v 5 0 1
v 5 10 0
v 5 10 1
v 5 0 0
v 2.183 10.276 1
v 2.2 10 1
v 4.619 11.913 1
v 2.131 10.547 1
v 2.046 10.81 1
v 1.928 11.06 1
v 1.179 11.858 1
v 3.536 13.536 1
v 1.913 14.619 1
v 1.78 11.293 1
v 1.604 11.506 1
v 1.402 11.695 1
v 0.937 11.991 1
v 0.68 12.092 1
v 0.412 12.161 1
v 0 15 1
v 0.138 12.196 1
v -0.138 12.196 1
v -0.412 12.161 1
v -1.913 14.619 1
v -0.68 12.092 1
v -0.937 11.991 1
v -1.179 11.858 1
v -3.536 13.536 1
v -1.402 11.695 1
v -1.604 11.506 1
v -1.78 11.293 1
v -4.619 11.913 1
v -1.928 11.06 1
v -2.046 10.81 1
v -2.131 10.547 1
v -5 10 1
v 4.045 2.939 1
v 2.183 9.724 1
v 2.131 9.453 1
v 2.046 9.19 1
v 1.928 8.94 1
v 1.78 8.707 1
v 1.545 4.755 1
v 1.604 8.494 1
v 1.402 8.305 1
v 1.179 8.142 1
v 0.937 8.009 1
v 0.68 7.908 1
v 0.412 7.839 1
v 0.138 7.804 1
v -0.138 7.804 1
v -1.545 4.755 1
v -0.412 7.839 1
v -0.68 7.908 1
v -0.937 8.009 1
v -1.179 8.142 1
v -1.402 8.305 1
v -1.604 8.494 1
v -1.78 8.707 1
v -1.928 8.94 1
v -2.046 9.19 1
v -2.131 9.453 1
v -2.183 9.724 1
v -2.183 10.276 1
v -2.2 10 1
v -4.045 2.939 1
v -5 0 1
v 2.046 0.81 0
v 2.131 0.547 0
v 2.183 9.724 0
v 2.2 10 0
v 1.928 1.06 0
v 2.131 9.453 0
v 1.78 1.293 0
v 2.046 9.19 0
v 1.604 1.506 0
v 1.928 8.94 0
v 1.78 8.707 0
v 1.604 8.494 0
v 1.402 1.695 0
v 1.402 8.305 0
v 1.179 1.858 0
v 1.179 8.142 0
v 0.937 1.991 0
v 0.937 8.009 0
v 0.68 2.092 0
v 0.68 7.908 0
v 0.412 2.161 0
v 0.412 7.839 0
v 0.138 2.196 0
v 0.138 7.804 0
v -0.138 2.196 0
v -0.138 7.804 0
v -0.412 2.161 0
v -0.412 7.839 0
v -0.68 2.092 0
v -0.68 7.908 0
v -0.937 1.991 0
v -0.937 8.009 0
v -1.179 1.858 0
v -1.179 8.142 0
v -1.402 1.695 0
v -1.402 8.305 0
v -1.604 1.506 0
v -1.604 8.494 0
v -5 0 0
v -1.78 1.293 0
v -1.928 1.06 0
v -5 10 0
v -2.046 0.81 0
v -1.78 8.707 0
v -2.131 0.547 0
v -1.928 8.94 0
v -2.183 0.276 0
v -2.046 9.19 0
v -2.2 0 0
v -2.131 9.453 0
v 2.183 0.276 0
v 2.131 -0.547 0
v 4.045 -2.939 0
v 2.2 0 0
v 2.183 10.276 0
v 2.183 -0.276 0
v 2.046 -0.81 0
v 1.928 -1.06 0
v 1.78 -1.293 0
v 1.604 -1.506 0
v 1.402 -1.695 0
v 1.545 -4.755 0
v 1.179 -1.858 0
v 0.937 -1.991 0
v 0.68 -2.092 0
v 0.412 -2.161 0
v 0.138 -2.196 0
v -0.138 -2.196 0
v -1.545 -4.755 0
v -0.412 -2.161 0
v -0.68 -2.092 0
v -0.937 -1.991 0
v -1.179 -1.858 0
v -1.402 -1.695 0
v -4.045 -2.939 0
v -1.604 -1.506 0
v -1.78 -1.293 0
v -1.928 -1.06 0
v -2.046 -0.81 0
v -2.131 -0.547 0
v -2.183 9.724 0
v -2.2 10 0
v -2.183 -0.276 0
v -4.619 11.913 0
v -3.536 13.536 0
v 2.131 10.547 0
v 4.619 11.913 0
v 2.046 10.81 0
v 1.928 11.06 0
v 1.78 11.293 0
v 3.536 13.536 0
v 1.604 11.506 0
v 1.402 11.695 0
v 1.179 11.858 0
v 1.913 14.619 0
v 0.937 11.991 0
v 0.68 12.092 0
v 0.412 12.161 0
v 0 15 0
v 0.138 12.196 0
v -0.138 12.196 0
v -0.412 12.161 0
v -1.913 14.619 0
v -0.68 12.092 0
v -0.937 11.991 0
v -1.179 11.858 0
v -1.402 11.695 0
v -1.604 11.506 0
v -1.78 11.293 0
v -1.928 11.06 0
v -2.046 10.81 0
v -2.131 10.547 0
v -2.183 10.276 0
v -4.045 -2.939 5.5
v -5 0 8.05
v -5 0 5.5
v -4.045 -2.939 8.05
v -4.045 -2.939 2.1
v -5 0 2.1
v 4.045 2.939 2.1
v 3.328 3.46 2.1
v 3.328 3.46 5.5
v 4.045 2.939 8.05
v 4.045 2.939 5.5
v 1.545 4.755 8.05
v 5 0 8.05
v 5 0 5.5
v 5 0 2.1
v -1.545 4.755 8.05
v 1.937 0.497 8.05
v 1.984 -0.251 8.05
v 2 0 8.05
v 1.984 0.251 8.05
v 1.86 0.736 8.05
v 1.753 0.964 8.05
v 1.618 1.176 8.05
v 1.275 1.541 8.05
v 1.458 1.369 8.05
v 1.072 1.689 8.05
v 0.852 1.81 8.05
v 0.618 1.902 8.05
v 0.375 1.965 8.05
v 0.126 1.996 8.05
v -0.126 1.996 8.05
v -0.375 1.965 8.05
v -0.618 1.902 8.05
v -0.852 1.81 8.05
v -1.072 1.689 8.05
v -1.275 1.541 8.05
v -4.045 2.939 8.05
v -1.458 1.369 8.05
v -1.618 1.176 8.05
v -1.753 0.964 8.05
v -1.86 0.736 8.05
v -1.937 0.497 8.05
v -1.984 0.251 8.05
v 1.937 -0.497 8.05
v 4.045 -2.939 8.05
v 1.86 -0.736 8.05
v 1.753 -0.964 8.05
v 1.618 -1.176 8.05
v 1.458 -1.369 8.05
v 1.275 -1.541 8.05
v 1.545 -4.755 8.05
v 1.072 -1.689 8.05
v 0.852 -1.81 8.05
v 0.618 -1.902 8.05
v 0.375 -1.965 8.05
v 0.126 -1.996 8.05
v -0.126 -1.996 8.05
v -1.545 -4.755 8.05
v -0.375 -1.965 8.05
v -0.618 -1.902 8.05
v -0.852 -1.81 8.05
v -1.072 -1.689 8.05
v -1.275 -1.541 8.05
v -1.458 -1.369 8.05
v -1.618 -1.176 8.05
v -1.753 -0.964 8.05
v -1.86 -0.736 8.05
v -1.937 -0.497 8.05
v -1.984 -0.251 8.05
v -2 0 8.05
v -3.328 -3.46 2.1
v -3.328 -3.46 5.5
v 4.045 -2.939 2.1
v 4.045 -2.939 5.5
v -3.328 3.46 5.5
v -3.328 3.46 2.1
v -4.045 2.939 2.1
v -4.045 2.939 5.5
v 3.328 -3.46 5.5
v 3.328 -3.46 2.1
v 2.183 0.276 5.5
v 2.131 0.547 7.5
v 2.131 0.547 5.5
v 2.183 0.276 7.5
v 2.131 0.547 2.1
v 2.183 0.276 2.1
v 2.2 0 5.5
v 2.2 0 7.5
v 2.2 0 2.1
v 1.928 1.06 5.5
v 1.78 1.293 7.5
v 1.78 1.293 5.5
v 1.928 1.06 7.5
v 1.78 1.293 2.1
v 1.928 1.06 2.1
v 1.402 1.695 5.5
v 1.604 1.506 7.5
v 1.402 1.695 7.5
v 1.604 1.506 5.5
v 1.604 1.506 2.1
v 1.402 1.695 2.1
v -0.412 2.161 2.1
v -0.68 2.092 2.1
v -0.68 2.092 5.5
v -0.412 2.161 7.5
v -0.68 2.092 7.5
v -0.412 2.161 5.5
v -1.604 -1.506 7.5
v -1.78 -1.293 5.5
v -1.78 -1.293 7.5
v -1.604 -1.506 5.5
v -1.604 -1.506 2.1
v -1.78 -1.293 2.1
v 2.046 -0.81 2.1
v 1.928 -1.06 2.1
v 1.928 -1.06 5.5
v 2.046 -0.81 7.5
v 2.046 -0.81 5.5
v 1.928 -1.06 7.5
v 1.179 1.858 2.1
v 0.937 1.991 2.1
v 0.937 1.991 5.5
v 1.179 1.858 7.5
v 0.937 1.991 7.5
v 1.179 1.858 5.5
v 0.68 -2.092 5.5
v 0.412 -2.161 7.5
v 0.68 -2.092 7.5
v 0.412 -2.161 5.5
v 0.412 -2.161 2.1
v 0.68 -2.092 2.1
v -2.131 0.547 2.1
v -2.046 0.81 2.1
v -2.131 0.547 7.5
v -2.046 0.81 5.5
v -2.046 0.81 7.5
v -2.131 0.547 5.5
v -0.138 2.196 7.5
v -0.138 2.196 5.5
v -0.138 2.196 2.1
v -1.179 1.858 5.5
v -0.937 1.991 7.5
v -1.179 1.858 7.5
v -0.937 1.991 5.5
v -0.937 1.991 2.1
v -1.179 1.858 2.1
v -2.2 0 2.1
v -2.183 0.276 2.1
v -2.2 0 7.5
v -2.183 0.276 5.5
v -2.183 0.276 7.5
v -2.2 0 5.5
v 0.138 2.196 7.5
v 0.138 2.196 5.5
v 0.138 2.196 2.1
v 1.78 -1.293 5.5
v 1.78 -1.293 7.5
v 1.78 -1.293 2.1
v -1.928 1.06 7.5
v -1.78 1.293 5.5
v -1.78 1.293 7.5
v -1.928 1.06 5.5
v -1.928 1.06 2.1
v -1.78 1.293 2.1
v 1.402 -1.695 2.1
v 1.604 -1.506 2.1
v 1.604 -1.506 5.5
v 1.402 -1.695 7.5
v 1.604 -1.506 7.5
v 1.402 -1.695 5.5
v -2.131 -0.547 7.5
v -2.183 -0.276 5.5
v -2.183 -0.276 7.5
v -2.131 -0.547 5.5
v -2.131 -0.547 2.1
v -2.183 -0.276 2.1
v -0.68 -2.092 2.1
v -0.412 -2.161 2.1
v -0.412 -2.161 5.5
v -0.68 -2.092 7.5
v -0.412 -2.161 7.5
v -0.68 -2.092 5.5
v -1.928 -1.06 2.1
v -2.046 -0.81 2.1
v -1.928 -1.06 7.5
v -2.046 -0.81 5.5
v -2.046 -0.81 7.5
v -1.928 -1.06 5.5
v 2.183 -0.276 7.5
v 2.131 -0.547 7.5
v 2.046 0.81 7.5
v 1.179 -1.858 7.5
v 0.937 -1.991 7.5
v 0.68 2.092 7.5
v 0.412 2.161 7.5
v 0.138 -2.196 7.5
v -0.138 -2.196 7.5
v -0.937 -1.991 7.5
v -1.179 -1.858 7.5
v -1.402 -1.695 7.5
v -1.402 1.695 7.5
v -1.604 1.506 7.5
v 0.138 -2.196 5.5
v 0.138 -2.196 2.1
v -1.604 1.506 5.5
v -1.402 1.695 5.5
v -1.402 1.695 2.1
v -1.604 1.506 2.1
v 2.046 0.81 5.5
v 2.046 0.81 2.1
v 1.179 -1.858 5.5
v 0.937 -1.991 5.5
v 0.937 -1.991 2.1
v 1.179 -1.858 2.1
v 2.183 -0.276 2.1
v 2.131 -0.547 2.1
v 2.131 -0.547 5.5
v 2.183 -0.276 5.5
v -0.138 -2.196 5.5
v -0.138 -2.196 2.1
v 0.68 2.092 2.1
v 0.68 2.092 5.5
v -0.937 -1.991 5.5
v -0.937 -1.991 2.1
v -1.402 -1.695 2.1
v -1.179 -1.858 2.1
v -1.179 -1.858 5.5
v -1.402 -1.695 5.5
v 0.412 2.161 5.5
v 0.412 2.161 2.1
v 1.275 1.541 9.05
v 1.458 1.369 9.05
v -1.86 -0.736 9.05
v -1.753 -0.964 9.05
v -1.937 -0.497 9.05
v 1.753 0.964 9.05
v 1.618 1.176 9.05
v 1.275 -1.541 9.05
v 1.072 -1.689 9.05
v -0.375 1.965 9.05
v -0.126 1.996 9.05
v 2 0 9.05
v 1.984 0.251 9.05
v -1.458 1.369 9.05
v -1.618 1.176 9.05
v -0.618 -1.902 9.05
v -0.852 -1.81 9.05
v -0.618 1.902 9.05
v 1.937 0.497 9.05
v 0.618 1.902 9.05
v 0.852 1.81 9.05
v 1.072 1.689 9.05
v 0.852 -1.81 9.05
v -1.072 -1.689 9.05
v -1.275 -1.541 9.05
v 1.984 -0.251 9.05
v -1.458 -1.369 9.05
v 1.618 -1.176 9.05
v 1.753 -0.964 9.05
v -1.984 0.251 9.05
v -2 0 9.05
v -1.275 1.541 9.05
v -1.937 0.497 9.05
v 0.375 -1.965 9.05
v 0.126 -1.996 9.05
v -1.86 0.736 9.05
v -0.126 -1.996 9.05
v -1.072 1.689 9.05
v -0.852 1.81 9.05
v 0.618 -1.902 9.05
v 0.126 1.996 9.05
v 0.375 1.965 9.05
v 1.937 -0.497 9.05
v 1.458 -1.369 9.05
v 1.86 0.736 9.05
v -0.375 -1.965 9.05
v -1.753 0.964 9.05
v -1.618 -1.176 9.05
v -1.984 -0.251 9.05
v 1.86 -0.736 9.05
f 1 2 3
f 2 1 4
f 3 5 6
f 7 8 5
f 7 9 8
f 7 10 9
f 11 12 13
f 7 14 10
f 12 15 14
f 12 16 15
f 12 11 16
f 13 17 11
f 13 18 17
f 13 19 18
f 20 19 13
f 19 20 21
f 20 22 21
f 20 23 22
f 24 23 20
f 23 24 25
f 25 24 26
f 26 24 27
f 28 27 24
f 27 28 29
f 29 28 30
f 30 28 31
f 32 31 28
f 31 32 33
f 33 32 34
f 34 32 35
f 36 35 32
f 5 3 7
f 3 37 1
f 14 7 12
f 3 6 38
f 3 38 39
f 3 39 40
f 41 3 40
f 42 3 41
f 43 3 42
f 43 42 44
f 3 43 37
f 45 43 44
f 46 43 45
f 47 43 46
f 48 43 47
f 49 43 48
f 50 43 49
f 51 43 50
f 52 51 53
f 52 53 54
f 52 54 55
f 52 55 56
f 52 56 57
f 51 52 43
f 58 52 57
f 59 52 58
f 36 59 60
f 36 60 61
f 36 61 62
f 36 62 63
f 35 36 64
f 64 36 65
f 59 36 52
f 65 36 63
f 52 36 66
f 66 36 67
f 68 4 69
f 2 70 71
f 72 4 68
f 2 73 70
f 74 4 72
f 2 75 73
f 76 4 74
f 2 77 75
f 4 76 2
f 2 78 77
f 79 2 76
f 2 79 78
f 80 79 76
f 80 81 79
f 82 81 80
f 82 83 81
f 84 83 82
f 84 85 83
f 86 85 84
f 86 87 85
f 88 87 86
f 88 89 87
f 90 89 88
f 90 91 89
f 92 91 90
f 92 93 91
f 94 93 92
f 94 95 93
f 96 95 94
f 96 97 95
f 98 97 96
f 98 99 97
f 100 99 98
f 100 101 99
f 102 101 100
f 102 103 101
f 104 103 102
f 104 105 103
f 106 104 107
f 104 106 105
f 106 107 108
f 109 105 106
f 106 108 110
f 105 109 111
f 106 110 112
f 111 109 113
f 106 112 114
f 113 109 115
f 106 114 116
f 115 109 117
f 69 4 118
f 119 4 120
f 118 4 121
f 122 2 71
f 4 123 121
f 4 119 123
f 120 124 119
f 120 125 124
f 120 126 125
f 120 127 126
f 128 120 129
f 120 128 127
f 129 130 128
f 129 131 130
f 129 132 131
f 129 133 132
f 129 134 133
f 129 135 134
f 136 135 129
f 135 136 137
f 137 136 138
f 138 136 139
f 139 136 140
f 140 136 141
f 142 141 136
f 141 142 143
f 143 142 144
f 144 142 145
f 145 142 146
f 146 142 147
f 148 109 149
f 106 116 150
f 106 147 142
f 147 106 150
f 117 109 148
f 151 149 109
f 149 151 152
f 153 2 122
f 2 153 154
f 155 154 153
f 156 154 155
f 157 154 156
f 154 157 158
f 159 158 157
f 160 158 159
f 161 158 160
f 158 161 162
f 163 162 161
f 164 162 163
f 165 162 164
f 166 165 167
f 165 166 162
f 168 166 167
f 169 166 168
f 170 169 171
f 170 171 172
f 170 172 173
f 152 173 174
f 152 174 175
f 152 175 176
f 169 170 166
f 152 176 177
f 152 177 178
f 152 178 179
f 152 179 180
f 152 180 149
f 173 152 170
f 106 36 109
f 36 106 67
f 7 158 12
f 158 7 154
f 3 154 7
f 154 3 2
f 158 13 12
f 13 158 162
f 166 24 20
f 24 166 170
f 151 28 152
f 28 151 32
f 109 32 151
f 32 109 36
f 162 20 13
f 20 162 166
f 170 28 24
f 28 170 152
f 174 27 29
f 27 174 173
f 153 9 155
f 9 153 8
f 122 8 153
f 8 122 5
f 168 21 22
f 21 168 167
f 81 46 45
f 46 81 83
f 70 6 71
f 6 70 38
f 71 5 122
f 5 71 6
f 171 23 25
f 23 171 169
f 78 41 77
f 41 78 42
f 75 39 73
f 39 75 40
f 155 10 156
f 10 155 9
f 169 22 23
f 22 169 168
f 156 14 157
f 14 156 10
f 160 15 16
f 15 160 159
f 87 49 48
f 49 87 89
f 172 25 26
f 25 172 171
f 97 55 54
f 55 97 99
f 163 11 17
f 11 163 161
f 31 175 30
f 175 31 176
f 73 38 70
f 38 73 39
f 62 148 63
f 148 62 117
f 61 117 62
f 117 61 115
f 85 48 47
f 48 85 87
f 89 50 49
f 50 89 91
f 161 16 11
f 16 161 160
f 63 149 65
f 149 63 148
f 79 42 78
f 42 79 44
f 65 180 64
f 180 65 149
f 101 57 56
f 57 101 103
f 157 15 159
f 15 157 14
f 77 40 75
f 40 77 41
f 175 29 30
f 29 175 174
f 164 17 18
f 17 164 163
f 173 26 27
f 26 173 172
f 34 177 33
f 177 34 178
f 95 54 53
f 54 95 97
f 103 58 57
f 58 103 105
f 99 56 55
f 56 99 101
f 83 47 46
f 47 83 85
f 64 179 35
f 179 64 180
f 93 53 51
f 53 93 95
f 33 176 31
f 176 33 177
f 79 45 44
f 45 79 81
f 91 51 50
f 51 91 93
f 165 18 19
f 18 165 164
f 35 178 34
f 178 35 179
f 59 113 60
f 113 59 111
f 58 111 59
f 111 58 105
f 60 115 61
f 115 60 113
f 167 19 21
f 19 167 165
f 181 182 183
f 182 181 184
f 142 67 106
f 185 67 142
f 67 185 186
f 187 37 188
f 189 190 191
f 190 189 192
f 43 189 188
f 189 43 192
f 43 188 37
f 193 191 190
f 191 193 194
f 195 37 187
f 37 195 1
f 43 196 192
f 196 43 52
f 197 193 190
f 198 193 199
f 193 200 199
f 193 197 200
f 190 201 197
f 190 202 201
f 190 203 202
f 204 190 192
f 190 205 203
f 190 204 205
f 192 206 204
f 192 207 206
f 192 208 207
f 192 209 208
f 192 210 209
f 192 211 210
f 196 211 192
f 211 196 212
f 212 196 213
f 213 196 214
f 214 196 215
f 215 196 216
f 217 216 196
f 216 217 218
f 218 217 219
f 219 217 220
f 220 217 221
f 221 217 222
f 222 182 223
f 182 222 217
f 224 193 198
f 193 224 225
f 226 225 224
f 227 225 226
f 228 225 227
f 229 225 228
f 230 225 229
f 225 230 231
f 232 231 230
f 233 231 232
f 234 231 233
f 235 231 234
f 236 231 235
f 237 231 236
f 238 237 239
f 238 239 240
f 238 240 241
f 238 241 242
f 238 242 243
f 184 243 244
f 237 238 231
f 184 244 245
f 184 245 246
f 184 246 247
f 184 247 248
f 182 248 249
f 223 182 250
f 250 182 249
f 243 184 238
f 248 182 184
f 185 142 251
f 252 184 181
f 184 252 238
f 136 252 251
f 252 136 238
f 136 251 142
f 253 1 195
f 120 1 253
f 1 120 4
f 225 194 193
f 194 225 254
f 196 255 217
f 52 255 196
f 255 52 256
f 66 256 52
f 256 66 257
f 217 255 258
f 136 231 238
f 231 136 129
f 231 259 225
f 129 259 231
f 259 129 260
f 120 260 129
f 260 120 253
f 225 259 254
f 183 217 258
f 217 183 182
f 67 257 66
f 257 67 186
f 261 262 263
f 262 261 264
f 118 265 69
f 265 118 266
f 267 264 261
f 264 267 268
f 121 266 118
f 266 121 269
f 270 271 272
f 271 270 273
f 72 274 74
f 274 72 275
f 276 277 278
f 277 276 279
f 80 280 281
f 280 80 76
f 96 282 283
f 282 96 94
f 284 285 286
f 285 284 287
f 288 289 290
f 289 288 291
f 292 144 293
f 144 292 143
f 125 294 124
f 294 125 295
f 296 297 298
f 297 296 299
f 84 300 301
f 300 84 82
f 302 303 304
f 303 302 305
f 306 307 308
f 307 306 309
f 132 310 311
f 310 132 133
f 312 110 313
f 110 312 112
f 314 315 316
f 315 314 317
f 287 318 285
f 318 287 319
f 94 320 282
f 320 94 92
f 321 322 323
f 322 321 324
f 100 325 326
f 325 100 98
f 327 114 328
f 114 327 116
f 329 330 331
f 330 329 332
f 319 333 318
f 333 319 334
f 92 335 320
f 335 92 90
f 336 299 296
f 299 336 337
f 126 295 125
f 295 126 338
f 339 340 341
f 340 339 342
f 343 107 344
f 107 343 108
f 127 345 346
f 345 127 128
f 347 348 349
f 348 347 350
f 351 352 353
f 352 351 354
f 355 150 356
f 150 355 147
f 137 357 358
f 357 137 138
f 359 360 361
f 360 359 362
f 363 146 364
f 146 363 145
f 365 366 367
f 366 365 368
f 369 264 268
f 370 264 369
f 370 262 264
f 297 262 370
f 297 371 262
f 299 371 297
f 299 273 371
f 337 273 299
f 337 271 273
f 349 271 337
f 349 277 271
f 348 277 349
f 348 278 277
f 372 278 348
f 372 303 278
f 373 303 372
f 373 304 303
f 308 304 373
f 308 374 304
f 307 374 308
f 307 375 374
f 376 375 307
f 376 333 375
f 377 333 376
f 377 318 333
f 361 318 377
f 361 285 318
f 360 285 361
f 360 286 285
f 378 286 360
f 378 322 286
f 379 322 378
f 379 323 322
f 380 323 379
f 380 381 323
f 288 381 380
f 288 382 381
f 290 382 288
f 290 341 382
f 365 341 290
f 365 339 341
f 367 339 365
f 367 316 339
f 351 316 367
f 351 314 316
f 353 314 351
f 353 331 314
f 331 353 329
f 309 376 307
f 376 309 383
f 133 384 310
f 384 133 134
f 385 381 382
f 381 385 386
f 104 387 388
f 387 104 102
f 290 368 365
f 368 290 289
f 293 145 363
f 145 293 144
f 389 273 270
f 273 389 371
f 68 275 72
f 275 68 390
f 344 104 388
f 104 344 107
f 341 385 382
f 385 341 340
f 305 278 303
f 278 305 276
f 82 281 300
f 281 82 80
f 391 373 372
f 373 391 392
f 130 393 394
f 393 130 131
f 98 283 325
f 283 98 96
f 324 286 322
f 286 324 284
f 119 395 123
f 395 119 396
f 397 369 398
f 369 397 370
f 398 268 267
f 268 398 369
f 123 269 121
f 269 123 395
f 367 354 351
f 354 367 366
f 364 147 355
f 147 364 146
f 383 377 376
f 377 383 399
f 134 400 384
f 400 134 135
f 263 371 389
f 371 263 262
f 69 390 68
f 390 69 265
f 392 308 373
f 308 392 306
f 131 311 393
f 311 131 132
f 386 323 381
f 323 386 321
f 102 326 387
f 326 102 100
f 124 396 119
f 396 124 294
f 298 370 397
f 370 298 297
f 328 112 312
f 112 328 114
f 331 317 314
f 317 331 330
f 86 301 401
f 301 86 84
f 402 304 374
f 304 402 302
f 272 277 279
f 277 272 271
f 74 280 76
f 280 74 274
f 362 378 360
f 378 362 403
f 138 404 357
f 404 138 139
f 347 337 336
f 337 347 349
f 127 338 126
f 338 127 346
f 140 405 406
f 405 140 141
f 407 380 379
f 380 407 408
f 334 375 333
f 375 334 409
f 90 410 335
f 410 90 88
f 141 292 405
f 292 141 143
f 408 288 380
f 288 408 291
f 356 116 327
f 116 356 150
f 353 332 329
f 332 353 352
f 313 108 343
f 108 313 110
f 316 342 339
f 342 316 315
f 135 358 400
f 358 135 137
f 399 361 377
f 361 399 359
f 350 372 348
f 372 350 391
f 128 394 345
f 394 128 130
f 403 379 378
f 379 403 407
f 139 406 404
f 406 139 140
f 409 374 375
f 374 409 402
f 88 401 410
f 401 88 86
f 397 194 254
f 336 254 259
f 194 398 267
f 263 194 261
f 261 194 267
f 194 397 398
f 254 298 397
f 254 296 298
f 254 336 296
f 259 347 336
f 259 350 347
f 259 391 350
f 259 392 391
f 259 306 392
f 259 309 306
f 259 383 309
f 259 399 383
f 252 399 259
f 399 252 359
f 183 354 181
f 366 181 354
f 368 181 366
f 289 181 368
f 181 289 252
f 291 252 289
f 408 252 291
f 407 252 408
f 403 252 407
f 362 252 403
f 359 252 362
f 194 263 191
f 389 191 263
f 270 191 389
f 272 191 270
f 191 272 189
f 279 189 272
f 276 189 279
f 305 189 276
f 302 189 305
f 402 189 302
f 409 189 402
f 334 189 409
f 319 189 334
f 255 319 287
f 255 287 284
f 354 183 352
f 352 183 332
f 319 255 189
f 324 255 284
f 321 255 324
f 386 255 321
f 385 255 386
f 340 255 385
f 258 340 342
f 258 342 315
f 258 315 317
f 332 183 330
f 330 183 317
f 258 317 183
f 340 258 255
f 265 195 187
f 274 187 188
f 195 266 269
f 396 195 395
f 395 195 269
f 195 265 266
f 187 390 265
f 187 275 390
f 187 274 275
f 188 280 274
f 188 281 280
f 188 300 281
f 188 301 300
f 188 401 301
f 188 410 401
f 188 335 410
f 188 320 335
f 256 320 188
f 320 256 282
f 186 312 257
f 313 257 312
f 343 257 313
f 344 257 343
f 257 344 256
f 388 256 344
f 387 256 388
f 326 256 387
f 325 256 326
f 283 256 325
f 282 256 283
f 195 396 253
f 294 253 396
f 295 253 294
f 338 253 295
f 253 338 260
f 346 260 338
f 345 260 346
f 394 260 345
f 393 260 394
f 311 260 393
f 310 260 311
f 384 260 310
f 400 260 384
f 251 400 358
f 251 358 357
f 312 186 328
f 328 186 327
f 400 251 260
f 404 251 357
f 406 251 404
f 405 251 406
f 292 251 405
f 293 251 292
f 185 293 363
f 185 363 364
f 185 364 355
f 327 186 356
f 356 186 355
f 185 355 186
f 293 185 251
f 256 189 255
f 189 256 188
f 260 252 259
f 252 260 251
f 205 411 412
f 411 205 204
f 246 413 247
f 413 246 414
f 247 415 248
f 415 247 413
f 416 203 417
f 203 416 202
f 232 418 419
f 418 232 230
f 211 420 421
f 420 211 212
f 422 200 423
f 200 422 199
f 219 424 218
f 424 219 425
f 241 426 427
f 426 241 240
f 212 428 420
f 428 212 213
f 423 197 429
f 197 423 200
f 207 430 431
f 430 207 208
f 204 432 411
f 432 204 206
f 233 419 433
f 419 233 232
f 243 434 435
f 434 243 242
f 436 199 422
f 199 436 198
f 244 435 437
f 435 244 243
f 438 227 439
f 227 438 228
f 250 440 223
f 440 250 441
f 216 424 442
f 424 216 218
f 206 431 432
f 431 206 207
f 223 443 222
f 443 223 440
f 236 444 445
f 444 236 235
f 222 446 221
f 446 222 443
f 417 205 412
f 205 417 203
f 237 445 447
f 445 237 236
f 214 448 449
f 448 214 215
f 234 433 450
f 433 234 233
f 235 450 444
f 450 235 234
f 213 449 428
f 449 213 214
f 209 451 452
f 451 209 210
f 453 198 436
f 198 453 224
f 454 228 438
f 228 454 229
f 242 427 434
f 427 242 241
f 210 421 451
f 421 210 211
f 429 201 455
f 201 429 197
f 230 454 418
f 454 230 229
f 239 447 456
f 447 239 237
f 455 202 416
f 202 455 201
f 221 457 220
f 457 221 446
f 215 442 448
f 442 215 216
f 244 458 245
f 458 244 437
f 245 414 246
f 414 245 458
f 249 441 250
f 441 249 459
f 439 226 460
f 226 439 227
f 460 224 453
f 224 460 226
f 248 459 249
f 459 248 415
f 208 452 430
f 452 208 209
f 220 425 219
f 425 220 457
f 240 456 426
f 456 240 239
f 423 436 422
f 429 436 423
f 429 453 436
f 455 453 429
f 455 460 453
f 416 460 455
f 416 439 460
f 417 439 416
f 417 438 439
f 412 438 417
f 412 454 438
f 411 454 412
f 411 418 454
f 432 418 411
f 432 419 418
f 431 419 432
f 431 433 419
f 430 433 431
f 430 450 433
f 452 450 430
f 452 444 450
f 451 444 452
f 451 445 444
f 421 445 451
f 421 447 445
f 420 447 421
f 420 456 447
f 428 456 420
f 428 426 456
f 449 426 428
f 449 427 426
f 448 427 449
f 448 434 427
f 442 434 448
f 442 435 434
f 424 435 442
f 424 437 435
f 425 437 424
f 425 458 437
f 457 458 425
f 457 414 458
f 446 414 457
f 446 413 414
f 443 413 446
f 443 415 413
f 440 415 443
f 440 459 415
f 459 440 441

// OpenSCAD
/*    This file is licensed under the following license:
    https://creativecommons.org/licenses/by-nc-nd/3.0/legalcode
    https://creativecommons.org/licenses/by-nc-nd/3.0/
    (c) 2019 Andreas Rath (derandi3D on www.thingiverse.com)
*/
/*
	Z-Axis 

/* [Global] */
// Thickness of your glas-bed
GlassPlateThikness = 3; 
// Thikness of the magnetic bed (if you remove it)
MagneticPlateThikness = 0.95;	
// length of stock screw measured from top side of carrier to top of screw
FabScrewHeight = 7;		

// Diameter of the knob
KnobDiameter = 10;		

// Height of the nut (M4 default)
NutHeight = 3.2;	
// Diameter of the nut on the parallel sides
NutDiameter = 6.92;
// Diameter of the screw (M4 default)
ScrewDiameter = 4;		

// Hight of the raised small knob
TopKnobHeight = 1;		
// Extra hight for fine alignement with sandpaper
TopKnobExtraHeight = 0;	

// Tolerance for additional width of holes and the nut-slot
Tolerance = 0.2;		

/* [Storage Tab] */
// Print with storage tab
withTab = 1;		// [0: no tab, 1: width tab]	

TabHeight = 1; 			// Hight of the storage tab
TabLength = 10;			// Length of the storage tab


/* [Hidden] */
MinBuildPlateThikness = 1;

_KnobHeight = FabScrewHeight-MagneticPlateThikness + GlassPlateThikness;
_HoleHeight = FabScrewHeight + 0.5;

echo(_KnobHeight=_KnobHeight, MagneticPlateThikness=MagneticPlateThikness, GlassPlateThikness=GlassPlateThikness);

module Tab() {
	difference() {
		union() {
			cube([KnobDiameter, TabLength, 1], true);
			translate([0,TabLength/2,0])
			cylinder(h=TabHeight, r=KnobDiameter/2, center=true);
		}
		translate([0, TabLength/2, 0])
			cylinder($fn=50, h=TabHeight, r=ScrewDiameter/2+Tolerance, 1, center=true);
	}
}

union() {
	difference() {
		union() {
			// the body
			cylinder($fn=10, h=_KnobHeight - TopKnobHeight, r=KnobDiameter/2, center=false);
			if(withTab == 1) {
				translate([0, TabLength/2, TabHeight/2])
					Tab();
			}
		}
		// the screw-hole
		cylinder($fn=50, h=_HoleHeight, r = ScrewDiameter/2+Tolerance, center=false);
		// slot for nut
		translate([0, 0, FabScrewHeight-NutHeight]) 
		cube([KnobDiameter+1, NutDiameter, NutHeight +Tolerance], true);
	}
	
	translate([0,0,_KnobHeight-TopKnobHeight])
		cylinder($fn=50, h=TopKnobHeight+TopKnobExtraHeight, r=ScrewDiameter/2, center=false);
	

}
